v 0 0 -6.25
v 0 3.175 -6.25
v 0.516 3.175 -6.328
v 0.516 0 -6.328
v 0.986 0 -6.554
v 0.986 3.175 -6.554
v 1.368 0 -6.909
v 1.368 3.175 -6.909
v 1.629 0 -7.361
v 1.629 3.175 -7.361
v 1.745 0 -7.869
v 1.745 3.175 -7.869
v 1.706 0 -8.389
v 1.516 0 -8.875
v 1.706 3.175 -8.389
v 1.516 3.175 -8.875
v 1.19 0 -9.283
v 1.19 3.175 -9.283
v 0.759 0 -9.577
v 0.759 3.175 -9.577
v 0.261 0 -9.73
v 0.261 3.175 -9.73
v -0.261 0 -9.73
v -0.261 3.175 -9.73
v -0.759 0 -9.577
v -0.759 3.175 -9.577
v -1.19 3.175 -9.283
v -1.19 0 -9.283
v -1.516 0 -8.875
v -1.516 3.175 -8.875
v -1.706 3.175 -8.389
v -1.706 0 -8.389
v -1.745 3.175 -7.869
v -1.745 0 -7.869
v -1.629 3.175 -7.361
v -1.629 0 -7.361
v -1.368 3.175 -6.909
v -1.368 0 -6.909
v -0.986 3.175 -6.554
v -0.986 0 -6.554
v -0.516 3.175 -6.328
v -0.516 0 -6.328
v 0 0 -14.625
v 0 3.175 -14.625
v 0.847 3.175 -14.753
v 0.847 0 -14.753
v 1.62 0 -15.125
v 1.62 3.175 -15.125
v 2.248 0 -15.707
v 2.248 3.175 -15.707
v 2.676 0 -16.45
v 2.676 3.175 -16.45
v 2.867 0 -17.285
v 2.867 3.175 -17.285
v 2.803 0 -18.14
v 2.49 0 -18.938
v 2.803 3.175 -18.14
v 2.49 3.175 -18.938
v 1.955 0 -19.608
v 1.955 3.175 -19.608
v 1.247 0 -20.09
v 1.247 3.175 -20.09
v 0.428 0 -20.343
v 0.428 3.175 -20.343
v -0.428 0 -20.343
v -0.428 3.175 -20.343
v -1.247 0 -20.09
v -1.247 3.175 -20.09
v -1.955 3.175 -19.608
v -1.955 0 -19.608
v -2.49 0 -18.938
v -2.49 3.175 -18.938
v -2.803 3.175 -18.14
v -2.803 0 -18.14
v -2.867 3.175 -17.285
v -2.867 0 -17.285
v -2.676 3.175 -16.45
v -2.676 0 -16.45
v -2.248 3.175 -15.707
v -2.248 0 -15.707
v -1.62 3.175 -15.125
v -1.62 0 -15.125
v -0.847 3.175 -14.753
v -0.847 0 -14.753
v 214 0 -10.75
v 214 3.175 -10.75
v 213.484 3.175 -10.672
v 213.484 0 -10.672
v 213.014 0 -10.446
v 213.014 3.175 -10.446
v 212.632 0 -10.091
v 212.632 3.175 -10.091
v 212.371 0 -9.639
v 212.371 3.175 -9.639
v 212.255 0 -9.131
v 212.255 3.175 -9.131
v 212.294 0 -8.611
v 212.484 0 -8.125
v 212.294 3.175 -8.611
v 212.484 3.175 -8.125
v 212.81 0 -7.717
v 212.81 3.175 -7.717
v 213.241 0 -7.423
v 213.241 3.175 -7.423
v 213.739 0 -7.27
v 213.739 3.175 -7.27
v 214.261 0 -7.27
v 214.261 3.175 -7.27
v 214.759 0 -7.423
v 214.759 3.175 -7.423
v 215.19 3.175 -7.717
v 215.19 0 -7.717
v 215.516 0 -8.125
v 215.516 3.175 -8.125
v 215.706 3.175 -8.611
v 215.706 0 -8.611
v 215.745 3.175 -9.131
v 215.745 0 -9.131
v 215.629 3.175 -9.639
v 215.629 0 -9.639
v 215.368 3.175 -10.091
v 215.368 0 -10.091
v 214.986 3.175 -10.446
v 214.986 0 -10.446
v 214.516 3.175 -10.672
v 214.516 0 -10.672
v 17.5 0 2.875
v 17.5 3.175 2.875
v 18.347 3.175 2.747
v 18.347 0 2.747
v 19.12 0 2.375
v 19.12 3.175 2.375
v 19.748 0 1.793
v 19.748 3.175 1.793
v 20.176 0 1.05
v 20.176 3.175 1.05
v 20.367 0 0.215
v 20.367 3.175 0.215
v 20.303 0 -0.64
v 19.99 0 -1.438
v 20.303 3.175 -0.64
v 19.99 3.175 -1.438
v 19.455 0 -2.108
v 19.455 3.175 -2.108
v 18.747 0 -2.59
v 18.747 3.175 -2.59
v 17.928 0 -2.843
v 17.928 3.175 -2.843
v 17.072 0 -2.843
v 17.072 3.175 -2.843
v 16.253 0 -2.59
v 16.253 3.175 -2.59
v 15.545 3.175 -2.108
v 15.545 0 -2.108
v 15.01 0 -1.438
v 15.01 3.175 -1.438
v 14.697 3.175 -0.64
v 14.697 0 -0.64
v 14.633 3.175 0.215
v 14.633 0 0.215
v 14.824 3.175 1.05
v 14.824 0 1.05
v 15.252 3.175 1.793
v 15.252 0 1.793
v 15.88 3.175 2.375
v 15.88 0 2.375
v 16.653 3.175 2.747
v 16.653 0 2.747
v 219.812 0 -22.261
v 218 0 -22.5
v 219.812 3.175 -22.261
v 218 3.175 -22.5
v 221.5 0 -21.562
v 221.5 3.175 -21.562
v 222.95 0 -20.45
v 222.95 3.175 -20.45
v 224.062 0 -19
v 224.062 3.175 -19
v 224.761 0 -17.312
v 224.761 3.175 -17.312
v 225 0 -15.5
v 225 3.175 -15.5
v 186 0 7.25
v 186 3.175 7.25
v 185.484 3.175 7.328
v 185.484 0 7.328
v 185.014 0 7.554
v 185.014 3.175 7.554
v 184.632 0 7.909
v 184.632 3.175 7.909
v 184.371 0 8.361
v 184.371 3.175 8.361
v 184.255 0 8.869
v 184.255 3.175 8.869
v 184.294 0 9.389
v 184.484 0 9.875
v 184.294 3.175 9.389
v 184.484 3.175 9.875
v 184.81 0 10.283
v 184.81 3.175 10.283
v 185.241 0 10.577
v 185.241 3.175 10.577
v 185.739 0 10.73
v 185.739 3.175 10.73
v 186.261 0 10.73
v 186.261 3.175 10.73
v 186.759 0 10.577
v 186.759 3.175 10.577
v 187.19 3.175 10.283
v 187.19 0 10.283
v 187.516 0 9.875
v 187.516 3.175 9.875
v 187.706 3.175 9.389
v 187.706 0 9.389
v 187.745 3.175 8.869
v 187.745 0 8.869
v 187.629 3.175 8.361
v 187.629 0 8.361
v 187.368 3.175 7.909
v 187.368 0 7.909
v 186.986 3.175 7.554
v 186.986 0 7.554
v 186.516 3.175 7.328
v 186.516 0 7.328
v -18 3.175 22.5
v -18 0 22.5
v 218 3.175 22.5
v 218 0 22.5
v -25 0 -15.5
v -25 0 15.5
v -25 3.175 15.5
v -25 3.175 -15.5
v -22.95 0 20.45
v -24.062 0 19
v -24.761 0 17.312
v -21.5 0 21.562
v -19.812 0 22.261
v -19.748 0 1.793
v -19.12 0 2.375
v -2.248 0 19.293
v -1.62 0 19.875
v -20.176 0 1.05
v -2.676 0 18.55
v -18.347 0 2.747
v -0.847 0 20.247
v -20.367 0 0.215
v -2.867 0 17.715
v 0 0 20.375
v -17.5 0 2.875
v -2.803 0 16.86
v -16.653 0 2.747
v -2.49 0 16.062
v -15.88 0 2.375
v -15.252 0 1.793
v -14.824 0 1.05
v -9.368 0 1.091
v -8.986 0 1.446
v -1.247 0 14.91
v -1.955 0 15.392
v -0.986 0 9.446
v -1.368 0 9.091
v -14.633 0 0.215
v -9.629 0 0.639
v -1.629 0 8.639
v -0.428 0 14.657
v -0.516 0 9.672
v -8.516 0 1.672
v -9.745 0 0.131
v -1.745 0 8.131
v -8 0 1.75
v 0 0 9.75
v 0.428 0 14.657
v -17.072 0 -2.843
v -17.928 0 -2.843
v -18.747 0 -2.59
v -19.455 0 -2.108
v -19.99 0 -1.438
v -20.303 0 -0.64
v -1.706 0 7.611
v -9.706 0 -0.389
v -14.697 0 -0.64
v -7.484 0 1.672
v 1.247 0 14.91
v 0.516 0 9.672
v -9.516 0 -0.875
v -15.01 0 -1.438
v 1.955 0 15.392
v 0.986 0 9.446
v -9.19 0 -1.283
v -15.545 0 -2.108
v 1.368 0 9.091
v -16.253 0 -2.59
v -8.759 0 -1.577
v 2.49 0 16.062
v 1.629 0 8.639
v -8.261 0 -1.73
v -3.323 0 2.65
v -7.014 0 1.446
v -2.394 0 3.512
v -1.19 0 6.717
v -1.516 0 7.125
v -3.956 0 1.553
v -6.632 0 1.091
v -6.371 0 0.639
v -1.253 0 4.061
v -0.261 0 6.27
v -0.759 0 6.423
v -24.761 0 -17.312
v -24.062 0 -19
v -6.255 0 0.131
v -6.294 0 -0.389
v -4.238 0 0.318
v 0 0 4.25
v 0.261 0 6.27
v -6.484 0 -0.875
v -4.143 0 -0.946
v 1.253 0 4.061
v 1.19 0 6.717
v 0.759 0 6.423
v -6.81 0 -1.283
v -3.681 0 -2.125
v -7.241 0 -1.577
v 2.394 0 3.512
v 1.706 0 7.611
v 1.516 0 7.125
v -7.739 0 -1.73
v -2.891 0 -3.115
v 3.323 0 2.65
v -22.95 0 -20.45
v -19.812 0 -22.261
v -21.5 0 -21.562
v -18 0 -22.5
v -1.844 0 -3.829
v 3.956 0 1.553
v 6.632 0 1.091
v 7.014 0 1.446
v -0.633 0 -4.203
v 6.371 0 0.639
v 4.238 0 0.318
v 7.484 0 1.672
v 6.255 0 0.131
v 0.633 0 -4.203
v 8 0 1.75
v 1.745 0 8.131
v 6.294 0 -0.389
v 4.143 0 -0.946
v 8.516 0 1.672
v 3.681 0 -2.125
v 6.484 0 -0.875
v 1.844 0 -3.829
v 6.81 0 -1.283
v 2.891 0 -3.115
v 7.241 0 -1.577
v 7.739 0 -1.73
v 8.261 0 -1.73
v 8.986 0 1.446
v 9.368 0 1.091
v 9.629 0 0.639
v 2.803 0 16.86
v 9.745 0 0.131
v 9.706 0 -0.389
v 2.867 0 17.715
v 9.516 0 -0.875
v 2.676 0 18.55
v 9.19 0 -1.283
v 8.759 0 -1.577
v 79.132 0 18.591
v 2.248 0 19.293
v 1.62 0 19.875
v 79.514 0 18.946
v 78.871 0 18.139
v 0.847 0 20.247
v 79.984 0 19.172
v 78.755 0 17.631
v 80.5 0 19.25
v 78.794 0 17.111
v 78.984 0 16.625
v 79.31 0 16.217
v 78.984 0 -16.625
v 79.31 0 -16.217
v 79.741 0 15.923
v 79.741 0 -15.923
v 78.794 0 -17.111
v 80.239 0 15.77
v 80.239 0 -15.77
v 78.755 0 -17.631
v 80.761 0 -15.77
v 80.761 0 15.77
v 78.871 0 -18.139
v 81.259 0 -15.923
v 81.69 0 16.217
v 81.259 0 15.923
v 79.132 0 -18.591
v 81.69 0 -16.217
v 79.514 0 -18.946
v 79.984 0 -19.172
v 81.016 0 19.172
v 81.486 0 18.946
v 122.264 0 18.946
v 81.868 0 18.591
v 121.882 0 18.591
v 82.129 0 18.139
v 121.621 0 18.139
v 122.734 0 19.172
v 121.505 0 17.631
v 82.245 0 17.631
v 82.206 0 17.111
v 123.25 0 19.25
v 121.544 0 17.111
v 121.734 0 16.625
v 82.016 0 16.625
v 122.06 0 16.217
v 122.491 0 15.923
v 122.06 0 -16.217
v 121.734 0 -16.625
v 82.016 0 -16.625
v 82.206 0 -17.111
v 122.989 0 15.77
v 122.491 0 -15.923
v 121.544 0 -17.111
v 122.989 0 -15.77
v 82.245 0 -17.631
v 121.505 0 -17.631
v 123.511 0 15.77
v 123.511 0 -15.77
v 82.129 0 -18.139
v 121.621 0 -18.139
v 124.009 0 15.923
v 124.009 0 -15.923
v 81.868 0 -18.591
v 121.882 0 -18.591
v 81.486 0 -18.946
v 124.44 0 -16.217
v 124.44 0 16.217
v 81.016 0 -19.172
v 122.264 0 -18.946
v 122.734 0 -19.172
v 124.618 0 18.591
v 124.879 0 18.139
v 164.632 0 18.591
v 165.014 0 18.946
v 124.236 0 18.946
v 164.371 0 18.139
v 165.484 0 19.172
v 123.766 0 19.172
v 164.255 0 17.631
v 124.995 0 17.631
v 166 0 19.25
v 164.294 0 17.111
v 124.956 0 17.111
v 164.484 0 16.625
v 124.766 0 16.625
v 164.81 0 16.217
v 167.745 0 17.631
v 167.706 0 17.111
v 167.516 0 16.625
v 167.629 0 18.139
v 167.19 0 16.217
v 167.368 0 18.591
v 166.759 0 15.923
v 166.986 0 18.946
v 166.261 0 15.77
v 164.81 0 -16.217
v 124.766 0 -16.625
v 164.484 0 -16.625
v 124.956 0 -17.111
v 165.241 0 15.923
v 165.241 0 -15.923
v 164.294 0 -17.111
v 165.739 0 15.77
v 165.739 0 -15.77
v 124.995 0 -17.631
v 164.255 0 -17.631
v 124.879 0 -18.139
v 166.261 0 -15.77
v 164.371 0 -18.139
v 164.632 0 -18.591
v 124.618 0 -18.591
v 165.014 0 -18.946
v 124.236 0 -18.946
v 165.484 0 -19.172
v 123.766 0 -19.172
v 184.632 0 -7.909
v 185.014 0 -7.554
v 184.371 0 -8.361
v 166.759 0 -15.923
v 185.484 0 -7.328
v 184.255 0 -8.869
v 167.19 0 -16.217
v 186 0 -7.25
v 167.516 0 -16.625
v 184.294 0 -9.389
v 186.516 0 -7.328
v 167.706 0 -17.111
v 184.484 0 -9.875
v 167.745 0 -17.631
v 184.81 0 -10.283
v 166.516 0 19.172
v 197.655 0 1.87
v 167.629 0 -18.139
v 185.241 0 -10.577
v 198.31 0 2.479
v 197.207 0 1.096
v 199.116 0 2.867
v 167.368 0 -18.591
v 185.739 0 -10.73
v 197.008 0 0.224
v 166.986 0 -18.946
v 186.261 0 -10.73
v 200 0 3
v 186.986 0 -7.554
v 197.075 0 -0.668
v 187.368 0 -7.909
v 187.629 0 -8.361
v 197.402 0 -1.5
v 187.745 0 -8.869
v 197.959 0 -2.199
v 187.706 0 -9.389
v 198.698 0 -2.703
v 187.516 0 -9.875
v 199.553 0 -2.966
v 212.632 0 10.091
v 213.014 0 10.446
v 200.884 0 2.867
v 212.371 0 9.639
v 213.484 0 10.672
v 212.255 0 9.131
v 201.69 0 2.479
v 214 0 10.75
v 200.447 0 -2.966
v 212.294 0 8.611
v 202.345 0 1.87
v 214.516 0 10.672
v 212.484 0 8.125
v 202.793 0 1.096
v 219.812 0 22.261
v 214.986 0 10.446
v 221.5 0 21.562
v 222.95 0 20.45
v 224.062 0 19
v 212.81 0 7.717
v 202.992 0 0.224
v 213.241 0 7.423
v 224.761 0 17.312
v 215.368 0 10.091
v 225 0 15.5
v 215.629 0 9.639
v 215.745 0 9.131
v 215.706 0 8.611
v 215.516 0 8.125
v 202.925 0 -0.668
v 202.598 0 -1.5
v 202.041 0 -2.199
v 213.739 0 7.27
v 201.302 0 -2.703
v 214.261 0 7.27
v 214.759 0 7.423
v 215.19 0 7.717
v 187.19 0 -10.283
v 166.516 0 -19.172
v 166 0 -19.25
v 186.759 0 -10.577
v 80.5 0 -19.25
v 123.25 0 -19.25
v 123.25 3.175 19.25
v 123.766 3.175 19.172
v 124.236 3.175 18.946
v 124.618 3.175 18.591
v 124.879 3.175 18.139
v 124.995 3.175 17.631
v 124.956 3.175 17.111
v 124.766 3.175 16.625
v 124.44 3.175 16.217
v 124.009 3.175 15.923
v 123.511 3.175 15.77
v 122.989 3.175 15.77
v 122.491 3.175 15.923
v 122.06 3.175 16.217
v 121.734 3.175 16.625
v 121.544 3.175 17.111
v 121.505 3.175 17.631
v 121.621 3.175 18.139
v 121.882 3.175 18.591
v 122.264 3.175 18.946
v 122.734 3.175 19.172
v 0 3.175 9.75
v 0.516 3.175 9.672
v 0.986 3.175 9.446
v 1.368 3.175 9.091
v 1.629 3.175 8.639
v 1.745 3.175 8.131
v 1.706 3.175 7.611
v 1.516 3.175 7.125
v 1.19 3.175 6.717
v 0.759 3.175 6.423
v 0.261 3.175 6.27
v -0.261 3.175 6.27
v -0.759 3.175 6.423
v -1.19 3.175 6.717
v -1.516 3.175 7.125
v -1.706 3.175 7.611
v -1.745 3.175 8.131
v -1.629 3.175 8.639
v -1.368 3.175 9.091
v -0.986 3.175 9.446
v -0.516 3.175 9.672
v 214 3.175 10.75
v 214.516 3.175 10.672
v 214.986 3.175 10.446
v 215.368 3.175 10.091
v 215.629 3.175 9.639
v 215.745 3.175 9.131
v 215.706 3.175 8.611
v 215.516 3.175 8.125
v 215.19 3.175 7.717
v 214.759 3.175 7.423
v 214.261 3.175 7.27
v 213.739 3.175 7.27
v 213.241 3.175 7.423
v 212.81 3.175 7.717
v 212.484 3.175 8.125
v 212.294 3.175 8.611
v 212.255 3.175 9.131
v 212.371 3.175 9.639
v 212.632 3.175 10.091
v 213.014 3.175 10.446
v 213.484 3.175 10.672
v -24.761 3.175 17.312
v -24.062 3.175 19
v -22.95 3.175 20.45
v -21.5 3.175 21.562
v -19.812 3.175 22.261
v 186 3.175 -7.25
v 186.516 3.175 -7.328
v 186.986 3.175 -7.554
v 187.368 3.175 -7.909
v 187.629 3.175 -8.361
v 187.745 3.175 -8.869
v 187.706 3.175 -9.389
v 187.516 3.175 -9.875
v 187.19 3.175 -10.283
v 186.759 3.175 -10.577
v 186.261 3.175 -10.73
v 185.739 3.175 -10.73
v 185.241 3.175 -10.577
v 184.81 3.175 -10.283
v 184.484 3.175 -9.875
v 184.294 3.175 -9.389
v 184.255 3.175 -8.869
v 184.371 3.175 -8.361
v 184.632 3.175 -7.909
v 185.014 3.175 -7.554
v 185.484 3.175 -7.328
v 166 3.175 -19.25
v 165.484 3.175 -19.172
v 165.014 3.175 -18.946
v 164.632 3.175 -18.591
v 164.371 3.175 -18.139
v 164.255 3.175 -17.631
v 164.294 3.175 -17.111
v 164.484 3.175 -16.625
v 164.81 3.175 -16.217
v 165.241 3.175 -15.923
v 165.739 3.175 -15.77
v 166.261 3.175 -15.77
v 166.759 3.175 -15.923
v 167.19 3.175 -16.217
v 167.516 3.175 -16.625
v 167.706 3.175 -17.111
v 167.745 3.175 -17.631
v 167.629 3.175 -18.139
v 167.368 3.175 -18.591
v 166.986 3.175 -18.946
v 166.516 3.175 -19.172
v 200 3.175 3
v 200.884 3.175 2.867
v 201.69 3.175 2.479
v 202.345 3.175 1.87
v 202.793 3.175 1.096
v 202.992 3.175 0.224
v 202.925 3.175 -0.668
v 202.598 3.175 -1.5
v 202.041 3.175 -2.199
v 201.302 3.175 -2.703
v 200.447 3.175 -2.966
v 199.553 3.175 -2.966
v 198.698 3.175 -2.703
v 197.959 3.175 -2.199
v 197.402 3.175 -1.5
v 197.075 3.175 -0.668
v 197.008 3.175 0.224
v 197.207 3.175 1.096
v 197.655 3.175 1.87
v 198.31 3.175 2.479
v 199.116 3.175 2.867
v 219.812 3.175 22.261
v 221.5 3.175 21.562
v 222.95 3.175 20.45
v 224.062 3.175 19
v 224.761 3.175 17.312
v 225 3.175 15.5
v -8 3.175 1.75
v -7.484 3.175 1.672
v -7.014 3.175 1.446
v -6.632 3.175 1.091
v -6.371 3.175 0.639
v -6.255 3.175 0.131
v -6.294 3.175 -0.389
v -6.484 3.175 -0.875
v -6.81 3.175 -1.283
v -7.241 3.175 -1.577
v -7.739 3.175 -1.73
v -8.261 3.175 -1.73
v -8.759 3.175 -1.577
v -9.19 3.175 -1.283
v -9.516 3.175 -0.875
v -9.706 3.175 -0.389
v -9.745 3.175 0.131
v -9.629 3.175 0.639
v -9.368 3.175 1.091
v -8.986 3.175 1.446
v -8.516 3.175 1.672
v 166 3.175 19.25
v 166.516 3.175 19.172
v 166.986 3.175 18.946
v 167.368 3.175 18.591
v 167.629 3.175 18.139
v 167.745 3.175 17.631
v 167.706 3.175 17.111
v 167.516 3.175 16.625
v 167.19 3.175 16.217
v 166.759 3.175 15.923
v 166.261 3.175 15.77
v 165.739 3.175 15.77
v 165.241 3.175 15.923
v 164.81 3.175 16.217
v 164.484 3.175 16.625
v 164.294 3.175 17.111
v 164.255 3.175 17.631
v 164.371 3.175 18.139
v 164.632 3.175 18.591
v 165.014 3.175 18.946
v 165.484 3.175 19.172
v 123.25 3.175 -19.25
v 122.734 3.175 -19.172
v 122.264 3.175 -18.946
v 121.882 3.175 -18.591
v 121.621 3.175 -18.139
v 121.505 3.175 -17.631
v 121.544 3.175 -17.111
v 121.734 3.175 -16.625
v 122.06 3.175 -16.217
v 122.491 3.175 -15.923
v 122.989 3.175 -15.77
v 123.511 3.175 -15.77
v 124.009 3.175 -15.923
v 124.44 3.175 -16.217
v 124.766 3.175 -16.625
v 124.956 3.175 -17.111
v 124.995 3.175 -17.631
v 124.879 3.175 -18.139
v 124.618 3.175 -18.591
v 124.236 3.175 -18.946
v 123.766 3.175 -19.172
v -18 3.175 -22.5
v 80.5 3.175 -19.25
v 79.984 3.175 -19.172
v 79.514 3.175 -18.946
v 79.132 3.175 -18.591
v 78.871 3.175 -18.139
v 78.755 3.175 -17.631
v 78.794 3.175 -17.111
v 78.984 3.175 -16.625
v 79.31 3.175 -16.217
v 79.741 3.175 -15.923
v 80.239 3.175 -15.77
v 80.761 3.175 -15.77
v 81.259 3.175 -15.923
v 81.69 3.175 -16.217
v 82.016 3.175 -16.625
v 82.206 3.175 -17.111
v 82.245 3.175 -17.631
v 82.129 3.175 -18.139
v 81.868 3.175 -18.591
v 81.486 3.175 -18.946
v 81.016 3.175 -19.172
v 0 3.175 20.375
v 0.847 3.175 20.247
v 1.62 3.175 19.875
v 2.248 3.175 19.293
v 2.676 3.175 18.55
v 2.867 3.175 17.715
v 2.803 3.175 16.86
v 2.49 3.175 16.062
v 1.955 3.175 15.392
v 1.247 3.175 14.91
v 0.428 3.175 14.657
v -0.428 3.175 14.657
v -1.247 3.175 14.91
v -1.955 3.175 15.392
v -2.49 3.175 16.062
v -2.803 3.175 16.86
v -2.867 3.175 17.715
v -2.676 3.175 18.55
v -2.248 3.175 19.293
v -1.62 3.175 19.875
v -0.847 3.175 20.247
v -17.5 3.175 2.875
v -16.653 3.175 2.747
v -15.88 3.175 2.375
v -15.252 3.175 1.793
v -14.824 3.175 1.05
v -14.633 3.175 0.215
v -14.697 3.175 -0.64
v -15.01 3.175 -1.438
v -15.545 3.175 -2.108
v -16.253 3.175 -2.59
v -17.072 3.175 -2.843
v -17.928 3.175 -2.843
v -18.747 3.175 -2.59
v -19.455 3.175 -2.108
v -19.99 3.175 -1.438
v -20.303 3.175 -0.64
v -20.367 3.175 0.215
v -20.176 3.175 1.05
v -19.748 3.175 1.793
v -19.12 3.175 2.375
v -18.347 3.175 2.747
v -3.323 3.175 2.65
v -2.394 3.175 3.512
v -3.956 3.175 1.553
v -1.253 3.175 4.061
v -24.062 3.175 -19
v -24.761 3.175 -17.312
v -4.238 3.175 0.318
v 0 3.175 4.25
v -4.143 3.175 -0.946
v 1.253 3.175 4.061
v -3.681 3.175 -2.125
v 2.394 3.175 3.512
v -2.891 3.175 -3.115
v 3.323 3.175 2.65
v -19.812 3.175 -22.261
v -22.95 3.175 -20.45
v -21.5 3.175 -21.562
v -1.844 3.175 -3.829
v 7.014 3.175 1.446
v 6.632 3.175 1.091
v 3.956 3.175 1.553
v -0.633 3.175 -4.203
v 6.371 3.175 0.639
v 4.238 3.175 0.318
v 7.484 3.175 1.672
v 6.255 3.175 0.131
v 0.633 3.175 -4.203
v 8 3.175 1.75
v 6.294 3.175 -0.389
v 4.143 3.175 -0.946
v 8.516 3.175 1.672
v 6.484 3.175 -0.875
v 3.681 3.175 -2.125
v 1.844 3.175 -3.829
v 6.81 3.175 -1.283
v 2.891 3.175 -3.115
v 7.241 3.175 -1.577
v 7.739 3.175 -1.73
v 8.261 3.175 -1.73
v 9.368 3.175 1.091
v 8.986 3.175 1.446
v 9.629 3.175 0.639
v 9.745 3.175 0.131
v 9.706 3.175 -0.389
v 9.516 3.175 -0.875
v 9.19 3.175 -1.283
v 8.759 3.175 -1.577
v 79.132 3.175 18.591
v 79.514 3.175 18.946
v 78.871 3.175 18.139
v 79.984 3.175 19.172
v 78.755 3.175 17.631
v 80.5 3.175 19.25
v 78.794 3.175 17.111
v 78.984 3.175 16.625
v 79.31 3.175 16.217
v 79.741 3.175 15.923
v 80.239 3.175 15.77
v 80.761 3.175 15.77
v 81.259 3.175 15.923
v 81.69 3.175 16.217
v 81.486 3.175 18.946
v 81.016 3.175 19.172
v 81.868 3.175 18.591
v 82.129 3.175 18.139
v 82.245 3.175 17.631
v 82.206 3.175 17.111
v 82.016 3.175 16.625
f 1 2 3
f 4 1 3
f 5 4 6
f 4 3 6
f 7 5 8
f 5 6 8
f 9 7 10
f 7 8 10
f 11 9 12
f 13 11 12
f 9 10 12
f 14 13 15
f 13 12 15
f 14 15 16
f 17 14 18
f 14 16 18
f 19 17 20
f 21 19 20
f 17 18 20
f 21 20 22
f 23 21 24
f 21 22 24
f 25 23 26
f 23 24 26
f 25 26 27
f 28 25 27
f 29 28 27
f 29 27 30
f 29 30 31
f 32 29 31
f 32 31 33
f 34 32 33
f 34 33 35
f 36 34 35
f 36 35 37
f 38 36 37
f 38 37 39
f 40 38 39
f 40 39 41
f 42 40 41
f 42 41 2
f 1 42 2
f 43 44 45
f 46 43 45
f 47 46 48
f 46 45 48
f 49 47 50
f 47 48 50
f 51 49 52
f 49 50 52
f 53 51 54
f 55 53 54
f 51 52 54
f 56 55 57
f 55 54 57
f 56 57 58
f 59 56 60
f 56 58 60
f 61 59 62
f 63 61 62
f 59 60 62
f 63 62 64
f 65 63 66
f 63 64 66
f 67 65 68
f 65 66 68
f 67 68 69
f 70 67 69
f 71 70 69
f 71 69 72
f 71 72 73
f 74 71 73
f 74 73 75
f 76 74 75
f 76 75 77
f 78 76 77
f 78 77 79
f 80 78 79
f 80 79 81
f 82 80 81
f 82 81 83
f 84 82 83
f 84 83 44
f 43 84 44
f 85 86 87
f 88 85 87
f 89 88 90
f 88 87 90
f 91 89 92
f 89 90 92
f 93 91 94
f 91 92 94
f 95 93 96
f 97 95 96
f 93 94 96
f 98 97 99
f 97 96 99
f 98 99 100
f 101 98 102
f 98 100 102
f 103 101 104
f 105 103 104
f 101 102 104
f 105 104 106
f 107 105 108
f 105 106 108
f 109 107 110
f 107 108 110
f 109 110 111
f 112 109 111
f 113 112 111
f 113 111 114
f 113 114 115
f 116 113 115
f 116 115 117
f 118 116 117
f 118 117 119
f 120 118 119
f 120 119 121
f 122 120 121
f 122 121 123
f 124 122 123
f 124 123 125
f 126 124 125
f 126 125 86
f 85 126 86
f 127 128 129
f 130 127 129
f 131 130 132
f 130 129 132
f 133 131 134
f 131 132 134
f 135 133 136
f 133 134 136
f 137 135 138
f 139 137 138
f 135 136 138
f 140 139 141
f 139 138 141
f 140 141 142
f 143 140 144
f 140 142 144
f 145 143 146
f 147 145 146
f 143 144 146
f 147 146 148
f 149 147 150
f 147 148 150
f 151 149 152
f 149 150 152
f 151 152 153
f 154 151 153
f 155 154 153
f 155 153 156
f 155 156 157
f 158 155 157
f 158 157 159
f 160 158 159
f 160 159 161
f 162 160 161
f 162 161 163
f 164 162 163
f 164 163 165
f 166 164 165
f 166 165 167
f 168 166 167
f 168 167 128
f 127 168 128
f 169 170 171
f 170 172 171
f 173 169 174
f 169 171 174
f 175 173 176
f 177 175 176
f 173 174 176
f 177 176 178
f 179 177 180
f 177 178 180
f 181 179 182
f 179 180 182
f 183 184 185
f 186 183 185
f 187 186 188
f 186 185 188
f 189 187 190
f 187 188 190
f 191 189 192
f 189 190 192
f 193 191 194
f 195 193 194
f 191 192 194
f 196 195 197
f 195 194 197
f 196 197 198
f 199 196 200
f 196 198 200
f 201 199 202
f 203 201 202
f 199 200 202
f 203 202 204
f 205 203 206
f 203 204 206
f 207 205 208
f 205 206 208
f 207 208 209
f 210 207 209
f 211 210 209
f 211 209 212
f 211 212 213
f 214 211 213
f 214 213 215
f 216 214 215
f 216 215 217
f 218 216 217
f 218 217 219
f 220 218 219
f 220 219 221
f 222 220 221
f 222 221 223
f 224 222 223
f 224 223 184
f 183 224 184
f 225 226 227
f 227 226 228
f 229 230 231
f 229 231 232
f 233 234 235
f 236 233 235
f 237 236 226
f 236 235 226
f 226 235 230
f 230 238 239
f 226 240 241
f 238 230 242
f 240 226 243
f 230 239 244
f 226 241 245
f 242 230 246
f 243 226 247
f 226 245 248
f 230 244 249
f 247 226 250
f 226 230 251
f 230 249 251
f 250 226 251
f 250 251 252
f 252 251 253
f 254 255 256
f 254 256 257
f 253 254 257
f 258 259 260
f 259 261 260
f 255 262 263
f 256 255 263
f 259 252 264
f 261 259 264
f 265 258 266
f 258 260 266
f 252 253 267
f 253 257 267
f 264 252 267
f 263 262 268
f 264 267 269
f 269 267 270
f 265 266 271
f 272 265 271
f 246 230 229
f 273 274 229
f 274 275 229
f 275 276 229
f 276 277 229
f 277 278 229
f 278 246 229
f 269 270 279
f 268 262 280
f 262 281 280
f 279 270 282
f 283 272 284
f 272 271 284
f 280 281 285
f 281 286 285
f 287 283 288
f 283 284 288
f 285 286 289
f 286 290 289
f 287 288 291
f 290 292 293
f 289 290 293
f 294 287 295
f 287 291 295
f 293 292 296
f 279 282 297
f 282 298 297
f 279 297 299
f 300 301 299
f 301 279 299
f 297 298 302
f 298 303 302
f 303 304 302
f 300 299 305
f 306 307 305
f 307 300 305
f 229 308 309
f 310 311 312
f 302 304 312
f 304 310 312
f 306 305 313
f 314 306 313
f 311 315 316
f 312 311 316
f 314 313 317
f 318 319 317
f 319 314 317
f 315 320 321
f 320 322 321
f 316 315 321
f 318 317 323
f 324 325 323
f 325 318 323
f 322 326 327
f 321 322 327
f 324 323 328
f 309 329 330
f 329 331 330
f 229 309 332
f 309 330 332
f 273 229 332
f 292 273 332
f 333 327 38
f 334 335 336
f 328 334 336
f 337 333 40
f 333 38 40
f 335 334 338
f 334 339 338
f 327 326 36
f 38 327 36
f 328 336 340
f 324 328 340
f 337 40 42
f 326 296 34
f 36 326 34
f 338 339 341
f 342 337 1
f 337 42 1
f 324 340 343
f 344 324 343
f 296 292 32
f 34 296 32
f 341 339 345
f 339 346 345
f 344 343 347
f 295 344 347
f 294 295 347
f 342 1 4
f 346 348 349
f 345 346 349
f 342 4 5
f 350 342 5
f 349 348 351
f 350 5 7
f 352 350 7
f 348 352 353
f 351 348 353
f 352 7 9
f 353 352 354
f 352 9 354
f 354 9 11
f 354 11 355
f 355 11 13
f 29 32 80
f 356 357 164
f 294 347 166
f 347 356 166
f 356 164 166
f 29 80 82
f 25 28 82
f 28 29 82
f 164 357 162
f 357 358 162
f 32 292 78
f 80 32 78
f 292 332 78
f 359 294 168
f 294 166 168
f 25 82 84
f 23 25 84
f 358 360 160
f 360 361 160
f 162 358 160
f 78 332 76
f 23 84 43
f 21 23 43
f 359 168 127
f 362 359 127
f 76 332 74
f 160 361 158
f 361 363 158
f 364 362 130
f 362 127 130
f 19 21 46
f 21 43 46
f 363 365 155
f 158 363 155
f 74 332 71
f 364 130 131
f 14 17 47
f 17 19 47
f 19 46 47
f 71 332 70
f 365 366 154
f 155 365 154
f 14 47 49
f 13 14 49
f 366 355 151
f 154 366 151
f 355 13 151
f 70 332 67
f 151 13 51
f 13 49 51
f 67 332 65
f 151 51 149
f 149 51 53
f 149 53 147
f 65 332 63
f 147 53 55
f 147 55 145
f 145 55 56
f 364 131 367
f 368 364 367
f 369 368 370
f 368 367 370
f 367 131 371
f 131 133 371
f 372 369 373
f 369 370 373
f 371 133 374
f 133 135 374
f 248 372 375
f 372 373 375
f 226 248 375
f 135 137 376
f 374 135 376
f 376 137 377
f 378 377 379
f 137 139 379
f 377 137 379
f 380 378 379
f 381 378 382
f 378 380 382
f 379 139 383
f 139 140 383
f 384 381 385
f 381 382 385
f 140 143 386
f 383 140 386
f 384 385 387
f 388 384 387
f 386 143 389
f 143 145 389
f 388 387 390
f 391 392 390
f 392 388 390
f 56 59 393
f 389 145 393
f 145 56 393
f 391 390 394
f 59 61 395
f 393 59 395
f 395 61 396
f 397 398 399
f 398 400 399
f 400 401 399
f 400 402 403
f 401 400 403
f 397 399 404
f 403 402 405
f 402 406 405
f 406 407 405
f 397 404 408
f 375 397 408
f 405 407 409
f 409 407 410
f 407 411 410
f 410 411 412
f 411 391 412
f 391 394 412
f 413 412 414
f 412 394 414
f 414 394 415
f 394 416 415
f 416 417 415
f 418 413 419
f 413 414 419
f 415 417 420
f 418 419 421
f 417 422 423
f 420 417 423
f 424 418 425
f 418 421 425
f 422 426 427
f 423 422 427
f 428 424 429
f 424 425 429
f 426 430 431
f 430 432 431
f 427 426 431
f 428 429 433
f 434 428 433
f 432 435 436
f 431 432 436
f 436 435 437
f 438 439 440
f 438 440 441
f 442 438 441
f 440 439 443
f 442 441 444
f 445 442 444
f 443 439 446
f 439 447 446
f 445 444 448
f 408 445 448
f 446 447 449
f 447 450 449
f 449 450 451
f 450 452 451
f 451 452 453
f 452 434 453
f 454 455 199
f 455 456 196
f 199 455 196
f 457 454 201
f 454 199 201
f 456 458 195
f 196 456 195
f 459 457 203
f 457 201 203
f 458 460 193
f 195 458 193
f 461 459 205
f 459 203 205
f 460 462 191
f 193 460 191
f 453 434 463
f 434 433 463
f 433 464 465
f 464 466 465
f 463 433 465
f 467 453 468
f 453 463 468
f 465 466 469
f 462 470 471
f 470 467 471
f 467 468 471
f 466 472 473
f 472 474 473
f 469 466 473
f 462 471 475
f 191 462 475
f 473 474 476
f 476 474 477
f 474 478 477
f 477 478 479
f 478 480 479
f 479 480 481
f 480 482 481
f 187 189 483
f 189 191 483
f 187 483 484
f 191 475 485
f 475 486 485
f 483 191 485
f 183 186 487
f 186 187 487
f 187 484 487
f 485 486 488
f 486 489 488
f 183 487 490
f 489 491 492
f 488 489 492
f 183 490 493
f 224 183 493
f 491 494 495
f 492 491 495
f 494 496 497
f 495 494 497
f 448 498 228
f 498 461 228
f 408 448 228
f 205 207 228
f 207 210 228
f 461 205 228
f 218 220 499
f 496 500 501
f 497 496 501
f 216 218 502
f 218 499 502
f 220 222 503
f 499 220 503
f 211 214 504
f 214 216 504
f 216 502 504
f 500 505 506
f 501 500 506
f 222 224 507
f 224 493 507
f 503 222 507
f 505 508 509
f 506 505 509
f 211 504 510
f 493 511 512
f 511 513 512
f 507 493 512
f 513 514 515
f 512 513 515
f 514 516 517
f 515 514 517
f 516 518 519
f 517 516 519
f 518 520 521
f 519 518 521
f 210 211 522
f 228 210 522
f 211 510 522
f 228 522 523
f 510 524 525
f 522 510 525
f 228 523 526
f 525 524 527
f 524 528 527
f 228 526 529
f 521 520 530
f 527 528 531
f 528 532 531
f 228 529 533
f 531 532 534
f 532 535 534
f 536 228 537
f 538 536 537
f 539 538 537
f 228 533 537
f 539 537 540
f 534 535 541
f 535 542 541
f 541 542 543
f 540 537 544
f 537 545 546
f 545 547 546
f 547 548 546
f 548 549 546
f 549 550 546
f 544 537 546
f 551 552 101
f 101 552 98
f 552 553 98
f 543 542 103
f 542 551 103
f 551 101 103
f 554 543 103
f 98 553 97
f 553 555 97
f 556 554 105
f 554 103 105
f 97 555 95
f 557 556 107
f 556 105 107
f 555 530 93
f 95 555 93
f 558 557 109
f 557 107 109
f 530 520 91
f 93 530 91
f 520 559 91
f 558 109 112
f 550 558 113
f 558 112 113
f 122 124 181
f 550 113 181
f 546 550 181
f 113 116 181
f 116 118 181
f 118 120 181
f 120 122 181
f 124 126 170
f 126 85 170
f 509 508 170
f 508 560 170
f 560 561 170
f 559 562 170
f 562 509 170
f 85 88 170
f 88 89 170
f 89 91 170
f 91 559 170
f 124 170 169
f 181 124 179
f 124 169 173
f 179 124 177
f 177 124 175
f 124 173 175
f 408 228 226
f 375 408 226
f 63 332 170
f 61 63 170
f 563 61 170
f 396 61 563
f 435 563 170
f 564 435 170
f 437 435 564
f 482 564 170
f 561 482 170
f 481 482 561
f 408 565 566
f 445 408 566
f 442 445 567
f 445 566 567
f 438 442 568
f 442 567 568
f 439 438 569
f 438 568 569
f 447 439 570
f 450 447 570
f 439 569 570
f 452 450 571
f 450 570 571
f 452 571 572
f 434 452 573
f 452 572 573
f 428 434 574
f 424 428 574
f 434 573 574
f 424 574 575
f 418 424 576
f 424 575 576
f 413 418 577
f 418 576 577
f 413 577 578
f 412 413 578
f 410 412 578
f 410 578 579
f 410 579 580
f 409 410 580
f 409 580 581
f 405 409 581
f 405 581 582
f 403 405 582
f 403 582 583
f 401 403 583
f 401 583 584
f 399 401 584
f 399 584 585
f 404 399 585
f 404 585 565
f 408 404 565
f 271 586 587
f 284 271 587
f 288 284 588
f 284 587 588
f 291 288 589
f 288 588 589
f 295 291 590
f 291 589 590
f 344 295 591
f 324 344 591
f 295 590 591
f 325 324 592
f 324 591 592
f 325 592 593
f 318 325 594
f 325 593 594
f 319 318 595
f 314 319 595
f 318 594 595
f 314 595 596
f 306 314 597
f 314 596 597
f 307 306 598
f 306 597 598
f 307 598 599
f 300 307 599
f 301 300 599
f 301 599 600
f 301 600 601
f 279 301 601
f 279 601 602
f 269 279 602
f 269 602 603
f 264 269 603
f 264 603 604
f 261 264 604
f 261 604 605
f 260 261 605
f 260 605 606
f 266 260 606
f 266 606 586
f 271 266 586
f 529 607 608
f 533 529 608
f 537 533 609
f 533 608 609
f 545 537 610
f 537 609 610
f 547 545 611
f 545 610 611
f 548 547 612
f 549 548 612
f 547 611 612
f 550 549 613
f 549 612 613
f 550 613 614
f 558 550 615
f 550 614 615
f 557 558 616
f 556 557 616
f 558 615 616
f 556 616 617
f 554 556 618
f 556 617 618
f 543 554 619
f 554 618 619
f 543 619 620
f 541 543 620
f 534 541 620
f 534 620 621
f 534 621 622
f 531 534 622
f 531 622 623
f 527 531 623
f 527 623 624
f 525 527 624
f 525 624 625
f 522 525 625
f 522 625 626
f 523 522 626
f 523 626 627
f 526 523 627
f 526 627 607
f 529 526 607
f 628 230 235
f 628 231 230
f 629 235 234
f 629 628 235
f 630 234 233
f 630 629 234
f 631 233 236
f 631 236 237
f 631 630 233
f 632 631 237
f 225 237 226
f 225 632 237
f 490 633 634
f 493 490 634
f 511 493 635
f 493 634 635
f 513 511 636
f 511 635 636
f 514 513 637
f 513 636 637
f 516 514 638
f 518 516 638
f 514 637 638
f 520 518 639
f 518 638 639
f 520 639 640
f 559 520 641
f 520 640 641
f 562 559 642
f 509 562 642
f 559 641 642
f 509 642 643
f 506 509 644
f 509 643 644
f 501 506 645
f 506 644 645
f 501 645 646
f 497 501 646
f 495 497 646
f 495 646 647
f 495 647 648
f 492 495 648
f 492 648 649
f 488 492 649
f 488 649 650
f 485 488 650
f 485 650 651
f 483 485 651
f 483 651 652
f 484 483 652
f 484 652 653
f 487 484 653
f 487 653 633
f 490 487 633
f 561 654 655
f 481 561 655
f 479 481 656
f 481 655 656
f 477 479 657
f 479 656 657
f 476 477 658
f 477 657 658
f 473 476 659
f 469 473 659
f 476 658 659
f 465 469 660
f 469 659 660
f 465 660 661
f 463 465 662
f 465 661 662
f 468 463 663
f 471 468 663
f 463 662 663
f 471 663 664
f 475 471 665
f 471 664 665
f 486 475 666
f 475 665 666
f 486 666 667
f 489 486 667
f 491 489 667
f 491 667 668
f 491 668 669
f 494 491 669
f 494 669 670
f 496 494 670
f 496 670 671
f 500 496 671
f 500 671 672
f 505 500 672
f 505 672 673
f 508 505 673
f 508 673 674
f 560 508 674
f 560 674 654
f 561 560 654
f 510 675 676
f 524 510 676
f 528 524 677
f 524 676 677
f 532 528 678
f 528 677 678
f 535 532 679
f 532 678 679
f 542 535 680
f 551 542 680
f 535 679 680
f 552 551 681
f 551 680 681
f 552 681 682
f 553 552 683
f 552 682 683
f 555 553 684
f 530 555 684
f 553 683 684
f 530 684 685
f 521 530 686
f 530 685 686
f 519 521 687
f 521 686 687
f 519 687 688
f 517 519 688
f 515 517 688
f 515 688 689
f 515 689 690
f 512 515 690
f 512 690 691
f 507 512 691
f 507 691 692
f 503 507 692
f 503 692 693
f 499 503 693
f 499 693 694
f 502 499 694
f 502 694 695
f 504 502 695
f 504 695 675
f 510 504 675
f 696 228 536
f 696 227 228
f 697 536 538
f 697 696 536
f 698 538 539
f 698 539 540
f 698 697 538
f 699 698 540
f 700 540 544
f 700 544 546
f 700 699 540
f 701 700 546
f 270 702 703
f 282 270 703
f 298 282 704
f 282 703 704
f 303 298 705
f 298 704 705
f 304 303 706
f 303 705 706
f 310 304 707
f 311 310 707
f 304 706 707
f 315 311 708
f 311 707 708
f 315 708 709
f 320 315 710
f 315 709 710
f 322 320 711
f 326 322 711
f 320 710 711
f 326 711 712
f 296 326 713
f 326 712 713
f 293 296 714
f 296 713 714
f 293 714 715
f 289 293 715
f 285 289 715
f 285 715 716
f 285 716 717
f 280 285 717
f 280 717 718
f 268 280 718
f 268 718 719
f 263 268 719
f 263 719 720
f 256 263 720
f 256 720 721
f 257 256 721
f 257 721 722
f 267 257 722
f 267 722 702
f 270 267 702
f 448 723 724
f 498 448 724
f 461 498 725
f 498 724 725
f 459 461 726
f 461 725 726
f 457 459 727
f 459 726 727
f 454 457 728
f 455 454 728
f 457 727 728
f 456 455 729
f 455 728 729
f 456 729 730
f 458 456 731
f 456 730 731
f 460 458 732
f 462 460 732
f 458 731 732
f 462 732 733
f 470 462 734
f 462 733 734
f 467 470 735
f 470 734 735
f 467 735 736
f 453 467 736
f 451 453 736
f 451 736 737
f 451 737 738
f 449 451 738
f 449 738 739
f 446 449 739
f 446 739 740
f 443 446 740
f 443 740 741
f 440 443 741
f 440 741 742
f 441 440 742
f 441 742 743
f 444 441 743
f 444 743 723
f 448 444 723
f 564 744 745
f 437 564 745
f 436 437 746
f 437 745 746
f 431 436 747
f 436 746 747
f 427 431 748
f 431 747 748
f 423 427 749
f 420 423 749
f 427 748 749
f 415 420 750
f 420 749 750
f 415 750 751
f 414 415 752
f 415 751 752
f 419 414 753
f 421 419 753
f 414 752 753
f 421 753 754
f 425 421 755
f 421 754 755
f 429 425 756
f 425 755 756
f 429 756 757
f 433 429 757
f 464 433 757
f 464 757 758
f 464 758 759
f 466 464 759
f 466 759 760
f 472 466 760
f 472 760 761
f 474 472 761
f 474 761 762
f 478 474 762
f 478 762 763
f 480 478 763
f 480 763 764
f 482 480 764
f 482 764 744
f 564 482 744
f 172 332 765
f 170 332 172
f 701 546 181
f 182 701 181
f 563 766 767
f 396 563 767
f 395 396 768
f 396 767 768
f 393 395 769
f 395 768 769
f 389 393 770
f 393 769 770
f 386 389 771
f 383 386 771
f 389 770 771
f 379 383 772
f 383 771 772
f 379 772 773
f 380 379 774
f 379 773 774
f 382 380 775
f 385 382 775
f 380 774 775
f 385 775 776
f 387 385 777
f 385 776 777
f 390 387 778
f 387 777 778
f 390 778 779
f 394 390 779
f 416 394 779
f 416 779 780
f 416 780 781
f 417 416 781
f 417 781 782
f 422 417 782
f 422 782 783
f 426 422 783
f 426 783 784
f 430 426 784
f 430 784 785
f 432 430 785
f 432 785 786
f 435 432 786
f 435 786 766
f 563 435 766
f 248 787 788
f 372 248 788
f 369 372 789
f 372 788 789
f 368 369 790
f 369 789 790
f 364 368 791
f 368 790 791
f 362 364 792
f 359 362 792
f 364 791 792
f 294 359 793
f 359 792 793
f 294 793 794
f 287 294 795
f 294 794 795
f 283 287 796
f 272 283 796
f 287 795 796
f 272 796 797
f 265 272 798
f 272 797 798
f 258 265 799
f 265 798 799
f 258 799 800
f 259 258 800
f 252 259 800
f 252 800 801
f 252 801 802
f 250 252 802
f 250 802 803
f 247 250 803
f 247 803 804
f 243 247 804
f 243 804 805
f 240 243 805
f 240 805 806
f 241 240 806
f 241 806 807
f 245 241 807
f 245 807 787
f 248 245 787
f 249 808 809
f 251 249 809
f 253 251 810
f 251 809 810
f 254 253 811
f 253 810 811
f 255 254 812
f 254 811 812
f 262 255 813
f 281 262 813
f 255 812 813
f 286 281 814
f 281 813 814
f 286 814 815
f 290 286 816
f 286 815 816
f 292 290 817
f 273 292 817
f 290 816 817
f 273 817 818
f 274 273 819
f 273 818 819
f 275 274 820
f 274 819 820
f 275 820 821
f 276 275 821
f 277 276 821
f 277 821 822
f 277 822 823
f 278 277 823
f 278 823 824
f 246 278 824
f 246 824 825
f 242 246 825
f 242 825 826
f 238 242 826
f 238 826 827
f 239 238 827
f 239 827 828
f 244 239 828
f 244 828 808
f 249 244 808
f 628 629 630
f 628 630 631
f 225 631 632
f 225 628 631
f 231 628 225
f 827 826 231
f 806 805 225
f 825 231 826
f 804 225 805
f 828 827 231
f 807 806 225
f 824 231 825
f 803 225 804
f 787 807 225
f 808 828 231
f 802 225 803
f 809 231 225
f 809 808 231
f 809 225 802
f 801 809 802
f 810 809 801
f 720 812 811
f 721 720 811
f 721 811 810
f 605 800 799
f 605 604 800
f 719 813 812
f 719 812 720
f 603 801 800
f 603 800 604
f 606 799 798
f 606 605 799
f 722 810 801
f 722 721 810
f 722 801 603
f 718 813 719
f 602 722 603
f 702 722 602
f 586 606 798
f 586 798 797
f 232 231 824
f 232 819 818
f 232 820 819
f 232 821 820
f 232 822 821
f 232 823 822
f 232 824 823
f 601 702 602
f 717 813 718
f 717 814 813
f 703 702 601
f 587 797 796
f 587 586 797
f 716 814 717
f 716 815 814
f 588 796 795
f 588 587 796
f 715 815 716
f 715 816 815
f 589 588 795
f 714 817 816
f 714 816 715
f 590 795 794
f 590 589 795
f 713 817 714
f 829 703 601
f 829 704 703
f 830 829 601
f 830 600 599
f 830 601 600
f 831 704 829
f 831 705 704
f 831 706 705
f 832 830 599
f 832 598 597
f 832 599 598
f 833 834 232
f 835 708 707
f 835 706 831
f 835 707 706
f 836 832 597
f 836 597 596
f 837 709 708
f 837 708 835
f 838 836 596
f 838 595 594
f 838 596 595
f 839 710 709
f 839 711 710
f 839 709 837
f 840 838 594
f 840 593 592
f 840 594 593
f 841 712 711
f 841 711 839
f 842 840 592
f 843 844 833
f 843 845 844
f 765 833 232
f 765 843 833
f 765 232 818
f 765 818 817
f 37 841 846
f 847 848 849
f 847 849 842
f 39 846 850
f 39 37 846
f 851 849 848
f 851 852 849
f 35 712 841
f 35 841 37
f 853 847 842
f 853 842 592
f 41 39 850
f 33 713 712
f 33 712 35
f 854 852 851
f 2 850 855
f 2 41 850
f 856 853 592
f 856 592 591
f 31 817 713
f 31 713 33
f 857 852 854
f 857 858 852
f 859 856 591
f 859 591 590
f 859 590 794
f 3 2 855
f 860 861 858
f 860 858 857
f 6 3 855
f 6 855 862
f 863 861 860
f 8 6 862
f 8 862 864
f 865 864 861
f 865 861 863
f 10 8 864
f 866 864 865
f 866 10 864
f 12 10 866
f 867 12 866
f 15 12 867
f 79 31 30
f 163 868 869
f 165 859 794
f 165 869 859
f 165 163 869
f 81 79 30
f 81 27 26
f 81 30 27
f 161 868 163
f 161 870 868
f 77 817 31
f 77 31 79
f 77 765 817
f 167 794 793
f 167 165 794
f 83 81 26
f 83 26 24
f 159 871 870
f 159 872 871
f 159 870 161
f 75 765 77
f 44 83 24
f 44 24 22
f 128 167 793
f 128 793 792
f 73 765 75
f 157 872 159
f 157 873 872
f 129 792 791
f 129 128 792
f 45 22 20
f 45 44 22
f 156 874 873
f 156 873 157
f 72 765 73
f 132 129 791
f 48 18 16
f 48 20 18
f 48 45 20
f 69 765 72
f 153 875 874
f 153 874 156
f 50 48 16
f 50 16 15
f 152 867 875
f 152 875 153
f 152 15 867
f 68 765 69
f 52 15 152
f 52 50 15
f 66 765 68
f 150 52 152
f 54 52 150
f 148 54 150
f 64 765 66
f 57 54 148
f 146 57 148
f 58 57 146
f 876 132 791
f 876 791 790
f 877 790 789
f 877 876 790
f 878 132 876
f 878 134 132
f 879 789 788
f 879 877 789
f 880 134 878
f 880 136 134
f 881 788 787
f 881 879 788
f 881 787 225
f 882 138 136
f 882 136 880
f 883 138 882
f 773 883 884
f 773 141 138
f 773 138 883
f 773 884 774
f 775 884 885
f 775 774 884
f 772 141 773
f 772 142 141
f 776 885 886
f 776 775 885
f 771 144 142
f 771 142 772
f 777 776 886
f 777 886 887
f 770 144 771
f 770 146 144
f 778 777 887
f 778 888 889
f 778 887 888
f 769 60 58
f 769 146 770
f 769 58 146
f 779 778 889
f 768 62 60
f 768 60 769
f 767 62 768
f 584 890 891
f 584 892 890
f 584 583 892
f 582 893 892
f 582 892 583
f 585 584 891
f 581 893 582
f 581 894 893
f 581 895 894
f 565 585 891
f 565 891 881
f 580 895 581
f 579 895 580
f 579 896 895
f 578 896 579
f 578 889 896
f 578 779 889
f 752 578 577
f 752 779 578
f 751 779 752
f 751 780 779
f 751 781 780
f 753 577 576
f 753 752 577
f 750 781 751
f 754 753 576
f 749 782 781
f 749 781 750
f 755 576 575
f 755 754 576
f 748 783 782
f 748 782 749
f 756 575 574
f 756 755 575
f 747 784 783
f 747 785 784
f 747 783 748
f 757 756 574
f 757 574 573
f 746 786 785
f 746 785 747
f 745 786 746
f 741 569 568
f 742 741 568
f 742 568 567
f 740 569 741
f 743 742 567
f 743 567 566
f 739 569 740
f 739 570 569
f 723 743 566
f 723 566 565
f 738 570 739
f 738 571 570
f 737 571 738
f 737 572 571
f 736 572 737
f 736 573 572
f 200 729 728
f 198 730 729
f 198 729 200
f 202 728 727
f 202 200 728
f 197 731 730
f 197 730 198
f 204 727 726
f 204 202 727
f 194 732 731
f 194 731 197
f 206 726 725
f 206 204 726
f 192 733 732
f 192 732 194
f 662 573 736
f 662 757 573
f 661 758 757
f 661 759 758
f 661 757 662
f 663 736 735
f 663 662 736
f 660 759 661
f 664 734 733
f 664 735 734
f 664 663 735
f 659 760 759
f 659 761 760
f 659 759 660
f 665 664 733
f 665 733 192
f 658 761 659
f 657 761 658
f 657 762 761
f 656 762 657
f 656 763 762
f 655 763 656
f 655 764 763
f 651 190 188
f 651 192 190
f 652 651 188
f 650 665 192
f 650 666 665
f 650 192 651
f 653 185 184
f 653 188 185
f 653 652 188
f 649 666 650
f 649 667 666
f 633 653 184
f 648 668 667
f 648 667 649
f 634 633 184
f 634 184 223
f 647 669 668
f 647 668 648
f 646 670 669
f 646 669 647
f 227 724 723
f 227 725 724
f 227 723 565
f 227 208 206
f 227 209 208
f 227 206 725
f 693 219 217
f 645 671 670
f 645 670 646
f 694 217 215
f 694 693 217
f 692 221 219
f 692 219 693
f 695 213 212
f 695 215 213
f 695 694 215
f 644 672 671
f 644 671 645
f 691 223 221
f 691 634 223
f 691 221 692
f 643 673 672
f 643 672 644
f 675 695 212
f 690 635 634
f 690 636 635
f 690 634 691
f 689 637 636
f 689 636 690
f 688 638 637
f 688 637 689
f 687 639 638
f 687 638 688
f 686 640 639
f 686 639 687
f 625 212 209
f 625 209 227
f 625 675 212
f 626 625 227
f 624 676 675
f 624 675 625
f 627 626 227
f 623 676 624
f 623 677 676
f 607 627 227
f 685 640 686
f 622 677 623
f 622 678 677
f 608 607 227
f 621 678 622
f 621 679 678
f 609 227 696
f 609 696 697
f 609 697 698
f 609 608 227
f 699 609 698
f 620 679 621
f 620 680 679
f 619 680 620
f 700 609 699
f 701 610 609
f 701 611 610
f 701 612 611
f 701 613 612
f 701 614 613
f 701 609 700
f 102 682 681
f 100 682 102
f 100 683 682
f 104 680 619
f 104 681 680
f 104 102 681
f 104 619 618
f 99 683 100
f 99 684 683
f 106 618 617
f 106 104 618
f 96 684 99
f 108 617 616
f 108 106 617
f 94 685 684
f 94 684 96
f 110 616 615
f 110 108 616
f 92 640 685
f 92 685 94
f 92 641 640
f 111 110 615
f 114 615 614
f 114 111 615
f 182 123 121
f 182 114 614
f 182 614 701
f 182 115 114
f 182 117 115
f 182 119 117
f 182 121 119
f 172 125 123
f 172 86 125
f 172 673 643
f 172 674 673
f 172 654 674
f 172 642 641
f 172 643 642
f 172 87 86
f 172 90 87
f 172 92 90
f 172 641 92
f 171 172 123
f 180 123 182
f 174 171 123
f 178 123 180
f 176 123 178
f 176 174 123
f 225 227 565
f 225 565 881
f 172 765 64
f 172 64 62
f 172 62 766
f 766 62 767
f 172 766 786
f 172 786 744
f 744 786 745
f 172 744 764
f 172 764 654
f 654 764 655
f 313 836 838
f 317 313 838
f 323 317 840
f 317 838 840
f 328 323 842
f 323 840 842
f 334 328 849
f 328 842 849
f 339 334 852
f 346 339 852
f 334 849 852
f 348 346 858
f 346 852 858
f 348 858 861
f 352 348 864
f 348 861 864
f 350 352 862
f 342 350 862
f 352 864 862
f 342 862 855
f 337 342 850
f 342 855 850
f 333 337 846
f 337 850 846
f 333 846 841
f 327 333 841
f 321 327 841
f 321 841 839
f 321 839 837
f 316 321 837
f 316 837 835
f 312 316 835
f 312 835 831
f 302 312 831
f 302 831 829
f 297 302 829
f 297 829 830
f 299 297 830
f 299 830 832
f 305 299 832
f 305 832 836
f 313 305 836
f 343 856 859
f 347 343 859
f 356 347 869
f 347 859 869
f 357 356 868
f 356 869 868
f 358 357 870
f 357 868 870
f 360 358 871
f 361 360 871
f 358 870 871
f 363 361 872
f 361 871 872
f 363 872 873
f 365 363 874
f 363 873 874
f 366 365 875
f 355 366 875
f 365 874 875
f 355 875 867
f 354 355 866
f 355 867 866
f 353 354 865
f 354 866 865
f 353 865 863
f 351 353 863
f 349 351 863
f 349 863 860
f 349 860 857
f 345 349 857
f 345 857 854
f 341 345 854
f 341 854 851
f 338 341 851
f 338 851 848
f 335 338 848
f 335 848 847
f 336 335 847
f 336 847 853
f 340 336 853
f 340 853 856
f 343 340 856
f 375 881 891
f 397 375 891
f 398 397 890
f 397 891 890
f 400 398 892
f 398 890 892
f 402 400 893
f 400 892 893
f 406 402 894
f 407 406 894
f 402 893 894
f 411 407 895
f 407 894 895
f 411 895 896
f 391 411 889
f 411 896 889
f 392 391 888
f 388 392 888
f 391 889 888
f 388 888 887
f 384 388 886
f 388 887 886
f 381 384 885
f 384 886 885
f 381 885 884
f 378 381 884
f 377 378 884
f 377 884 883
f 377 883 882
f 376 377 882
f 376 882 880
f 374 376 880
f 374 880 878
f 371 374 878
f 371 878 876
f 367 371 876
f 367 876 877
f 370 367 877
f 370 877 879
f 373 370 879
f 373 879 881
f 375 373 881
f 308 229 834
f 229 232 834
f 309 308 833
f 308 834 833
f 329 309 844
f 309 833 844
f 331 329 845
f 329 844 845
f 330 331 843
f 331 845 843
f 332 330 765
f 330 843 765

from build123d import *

# Parameters (mm, degrees)
SKETCH1_W           = 250
SKETCH1_H           = 45
BOSS_EXTRUDE1_DEPTH = 3.175
SKETCH4_R           = 3
SKETCH4_R_2         = 1.75
CUT_EXTRUDE1_DEPTH  = 227.144490592
SKETCH5_R           = 4.25
CUT_EXTRUDE2_DEPTH  = 227.144490592
SKETCH10_R          = 1.75
CUT_EXTRUDE4_DEPTH  = 227.144490592
FILLET1_R           = 7
SKETCH11_R          = 2.875
CUT_EXTRUDE5_DEPTH  = 227.144490592
SKETCH12_R          = 1.75
CUT_EXTRUDE6_DEPTH  = 227.144490592


with BuildPart() as part:
    # Sketch1 → Boss-Extrude1 (new body)
    with BuildSketch(Plane(origin=(0, 0, 0), x_dir=(1, 0, 0), z_dir=(0, 1, 0))):
        with Locations((100, 0)):
            Rectangle(SKETCH1_W, SKETCH1_H)
    extrude(amount=BOSS_EXTRUDE1_DEPTH)

    # Sketch4 → Cut-Extrude1 (cut, through all)
    with BuildSketch(Plane(origin=(0, 3.175, 0), x_dir=(1, 0, 0), z_dir=(0, 1, 0))):
        with Locations(Location((200, 0, 0), (0, 0, 270))):
            Circle(SKETCH4_R)
        with Locations(Location((186, 9, 0), (0, 0, 270))):
            Circle(SKETCH4_R_2)
        with Locations(Location((214, 9, 0), (0, 0, 90))):
            Circle(SKETCH4_R_2)
        with Locations(Location((214, -9, 0), (0, 0, 270))):
            Circle(SKETCH4_R_2)
        with Locations(Location((186, -9, 0), (0, 0, 90))):
            Circle(SKETCH4_R_2)
    extrude(amount=-CUT_EXTRUDE1_DEPTH, mode=Mode.SUBTRACT)

    # Sketch5 → Cut-Extrude2 (cut, through all)
    with BuildSketch(Plane(origin=(0, 3.175, 0), x_dir=(1, 0, 0), z_dir=(0, 1, 0))):
        with Locations(Location((0, 0, 0), (0, 0, 270))):
            Circle(SKETCH5_R)
    extrude(amount=-CUT_EXTRUDE2_DEPTH, mode=Mode.SUBTRACT)

    # Sketch10 → Cut-Extrude4 (cut, through all)
    with BuildSketch(Plane(origin=(0, 3.175, 0), x_dir=(1, 0, 0), z_dir=(0, 1, 0))):
        with Locations(Location((80.5, -17.5, 0), (0, 0, 270))):
            Circle(SKETCH10_R)
        with Locations(Location((166, -17.5, 0), (0, 0, 270))):
            Circle(SKETCH10_R)
        with Locations(Location((166, 17.5, 0), (0, 0, 90))):
            Circle(SKETCH10_R)
        with Locations(Location((80.5, 17.5, 0), (0, 0, 90))):
            Circle(SKETCH10_R)
        with Locations(Location((123.25, -17.5, 0), (0, 0, 270))):
            Circle(SKETCH10_R)
        with Locations(Location((123.25, 17.5, 0), (0, 0, 90))):
            Circle(SKETCH10_R)
    extrude(amount=-CUT_EXTRUDE4_DEPTH, mode=Mode.SUBTRACT)

    # Fillet1
    fillet1_edges = [part.edges().sort_by_distance(p)[0] for p in [
        (-25, 1.5875, -22.5),
        (225, 1.5875, -22.5),
        (225, 1.5875, 22.5),
        (-25, 1.5875, 22.5),
    ]]
    fillet(fillet1_edges, radius=FILLET1_R)

    # Sketch11 → Cut-Extrude5 (cut, through all)
    with BuildSketch(Plane(origin=(0, 3.175, 0), x_dir=(1, 0, 0), z_dir=(0, 1, 0))):
        with Locations(Location((0, 17.5, 0), (0, 0, 270))):
            Circle(SKETCH11_R)
        with Locations(Location((17.5, 0, 0), (0, 0, 270))):
            Circle(SKETCH11_R)
        with Locations(Location((0, -17.5, 0), (0, 0, 270))):
            Circle(SKETCH11_R)
        with Locations(Location((-17.5, 0, 0), (0, 0, 270))):
            Circle(SKETCH11_R)
    extrude(amount=-CUT_EXTRUDE5_DEPTH, mode=Mode.SUBTRACT)

    # Sketch12 → Cut-Extrude6 (cut, through all)
    with BuildSketch(Plane(origin=(0, 3.175, 0), x_dir=(1, 0, 0), z_dir=(0, 1, 0))):
        with Locations(Location((0, 8, 0), (0, 0, 270))):
            Circle(SKETCH12_R)
        with Locations(Location((8, 0, 0), (0, 0, 270))):
            Circle(SKETCH12_R)
        with Locations(Location((0, -8, 0), (0, 0, 270))):
            Circle(SKETCH12_R)
        with Locations(Location((-8, 0, 0), (0, 0, 270))):
            Circle(SKETCH12_R)
    extrude(amount=-CUT_EXTRUDE6_DEPTH, mode=Mode.SUBTRACT)


solid = part.part
